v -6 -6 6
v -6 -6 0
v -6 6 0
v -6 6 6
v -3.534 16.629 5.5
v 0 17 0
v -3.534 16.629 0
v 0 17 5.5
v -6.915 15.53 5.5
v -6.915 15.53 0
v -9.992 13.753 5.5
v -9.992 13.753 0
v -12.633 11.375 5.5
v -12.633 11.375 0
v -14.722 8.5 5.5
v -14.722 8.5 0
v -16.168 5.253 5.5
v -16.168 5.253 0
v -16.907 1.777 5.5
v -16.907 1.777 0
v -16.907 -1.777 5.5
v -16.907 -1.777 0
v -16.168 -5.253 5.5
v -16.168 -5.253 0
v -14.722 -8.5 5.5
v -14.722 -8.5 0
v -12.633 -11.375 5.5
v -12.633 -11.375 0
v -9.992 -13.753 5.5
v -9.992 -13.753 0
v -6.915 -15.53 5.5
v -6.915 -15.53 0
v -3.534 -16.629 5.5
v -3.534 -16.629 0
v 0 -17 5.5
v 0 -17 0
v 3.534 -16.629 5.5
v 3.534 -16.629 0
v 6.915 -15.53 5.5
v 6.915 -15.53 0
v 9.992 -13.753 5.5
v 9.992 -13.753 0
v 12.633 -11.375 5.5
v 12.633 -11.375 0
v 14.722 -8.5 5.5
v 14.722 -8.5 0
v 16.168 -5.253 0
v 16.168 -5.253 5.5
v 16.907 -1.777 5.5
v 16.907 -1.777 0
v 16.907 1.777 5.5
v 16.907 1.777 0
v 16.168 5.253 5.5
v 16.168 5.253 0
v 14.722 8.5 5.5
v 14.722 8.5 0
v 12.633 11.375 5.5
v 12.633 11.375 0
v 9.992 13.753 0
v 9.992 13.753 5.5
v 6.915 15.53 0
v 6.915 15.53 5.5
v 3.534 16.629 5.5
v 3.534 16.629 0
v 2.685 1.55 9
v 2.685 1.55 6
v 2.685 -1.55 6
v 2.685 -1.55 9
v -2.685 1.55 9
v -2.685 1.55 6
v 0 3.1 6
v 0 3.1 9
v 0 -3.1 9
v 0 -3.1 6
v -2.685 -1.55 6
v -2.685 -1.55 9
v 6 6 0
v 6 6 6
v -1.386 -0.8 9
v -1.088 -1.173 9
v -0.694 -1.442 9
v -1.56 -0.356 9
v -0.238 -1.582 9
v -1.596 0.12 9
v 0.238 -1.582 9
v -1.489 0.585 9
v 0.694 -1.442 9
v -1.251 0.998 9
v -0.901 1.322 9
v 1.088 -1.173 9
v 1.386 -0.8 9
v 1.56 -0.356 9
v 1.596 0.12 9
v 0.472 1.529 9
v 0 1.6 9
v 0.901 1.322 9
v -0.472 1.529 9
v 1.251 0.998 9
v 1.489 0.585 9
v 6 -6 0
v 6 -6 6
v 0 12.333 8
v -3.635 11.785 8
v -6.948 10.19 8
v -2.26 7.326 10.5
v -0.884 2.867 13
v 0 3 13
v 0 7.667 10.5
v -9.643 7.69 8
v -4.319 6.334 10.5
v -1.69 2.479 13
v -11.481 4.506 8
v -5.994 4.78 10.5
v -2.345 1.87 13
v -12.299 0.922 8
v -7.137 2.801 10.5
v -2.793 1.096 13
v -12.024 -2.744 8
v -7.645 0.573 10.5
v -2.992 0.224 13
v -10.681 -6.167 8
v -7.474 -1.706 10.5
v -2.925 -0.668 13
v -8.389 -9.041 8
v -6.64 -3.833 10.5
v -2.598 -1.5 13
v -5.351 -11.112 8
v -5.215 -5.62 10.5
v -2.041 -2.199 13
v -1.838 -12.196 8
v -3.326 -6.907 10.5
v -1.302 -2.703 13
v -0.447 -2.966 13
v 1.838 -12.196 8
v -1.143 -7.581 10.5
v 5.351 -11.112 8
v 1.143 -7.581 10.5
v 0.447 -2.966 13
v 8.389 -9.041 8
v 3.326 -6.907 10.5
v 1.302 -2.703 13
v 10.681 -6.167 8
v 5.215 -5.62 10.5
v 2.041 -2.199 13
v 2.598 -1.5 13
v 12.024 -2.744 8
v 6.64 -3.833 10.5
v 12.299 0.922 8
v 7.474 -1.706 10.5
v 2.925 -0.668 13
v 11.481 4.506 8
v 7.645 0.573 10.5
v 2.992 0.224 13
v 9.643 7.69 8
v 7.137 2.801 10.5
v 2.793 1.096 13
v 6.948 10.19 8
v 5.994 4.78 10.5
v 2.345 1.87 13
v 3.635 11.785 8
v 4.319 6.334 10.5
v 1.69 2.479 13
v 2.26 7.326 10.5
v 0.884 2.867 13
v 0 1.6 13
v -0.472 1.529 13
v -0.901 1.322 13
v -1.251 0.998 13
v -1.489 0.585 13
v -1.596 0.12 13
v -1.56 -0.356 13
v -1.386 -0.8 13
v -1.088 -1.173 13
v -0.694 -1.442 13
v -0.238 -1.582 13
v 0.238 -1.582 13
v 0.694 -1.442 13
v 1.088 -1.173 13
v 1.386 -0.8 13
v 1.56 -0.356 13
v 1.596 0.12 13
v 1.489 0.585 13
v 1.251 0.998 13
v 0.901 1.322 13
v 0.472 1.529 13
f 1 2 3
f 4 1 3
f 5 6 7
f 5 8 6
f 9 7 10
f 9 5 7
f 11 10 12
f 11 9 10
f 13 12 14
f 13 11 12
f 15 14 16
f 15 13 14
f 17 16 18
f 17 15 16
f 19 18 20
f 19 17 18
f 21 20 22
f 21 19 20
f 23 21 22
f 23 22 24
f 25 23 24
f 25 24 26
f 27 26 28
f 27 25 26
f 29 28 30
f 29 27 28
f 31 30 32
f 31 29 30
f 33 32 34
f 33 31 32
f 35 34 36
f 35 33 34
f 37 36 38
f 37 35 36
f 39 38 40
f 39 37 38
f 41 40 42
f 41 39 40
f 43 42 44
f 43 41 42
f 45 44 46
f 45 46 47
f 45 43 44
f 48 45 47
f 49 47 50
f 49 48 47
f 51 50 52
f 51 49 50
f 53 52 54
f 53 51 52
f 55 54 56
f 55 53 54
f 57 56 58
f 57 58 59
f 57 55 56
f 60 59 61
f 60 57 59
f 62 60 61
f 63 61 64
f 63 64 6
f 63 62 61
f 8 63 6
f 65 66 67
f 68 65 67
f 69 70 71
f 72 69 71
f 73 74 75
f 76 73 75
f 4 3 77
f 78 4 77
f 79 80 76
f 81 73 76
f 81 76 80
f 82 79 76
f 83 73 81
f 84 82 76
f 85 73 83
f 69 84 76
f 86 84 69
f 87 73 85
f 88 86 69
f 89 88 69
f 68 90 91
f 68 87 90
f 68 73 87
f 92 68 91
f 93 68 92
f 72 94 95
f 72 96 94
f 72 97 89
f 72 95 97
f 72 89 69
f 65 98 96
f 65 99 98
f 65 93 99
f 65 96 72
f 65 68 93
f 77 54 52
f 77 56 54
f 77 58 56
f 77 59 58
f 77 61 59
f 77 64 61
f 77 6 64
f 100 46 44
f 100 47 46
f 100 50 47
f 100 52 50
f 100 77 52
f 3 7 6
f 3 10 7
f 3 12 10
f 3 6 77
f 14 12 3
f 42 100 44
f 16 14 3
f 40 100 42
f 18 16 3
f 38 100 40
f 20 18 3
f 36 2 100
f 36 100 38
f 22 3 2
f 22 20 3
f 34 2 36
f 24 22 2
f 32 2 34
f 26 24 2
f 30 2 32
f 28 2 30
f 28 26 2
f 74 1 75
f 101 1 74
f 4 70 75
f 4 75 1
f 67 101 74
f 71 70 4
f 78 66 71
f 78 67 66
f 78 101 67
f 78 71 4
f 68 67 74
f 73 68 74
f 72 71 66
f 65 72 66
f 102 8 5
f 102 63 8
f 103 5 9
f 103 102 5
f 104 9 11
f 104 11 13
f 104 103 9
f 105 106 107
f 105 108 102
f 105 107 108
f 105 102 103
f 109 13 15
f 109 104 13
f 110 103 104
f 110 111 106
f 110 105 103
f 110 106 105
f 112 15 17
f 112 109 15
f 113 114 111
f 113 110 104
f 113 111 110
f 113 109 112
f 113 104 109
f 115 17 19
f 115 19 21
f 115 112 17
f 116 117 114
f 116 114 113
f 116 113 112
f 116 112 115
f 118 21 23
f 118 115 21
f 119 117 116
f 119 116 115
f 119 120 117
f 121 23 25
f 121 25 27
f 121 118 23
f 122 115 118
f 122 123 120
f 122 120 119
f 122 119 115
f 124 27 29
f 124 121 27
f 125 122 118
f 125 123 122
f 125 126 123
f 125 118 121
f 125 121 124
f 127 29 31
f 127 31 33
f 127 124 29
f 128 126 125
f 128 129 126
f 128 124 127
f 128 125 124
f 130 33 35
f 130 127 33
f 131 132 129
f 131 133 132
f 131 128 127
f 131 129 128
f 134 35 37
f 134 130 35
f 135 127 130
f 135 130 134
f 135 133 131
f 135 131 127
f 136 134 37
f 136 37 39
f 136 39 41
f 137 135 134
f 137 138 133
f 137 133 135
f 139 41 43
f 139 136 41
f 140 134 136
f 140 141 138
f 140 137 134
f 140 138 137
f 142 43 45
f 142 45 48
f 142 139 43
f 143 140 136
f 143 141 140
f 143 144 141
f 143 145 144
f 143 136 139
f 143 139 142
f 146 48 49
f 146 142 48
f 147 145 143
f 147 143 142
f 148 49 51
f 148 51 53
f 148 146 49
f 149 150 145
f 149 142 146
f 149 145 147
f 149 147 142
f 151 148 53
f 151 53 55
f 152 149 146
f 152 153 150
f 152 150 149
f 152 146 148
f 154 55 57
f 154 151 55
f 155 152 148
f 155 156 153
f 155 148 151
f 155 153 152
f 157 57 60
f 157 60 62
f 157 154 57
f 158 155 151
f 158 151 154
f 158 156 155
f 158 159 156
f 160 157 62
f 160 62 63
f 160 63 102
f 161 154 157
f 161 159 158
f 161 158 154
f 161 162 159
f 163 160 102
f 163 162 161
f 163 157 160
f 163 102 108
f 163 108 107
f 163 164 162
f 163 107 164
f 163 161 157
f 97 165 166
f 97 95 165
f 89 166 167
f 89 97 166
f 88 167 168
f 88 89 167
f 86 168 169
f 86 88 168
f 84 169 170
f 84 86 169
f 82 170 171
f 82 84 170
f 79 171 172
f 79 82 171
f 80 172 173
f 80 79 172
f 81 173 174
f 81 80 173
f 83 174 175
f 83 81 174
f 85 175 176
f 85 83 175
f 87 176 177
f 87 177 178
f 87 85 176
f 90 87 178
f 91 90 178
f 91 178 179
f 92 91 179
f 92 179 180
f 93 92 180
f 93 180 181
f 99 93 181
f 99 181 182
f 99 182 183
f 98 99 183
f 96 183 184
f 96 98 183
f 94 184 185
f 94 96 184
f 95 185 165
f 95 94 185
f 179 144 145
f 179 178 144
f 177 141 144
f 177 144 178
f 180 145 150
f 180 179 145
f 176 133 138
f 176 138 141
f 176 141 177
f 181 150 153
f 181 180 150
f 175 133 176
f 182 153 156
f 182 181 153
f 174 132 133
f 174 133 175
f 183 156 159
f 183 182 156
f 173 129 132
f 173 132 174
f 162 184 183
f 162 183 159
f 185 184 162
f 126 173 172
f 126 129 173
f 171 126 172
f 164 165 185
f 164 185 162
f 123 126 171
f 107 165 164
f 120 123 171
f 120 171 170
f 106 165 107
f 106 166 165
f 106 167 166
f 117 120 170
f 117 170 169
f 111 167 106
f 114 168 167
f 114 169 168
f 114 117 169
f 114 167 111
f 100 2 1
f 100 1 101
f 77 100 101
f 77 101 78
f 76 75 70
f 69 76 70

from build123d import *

# Parameters (mm, degrees)
SKETCH_W        = 12
SKETCH_H        = 12
POCKET_DEPTH    = 6
POCKET001_DEPTH = 3


with BuildPart() as part:
    # Sketch002 → Revolution (revolve)
    with BuildSketch(Plane.YZ):
        Polygon((1.6, 13), (1.6, 0), (17, 0), (17, 5.5), (3, 13), align=None)
    revolve(axis=Axis((0, 0, 0), (0, 0, 1)))

    # Sketch (on Face2 of Revolution) → Pocket (cut)
    with BuildSketch(Plane.YX):
        Rectangle(SKETCH_W, SKETCH_H)
    extrude(amount=-POCKET_DEPTH, mode=Mode.SUBTRACT)

    # Sketch003 (on Face2 of Pocket) → Pocket001 (cut)
    with BuildSketch(Plane.YX.offset(-6)):
        Polygon((3.1, 0), (1.55, 2.684679), (-1.55, 2.684679), (-3.1, 0), (-1.55, -2.684679), (1.55, -2.684679), align=None)
    extrude(amount=-POCKET001_DEPTH, mode=Mode.SUBTRACT)


solid = part.part
